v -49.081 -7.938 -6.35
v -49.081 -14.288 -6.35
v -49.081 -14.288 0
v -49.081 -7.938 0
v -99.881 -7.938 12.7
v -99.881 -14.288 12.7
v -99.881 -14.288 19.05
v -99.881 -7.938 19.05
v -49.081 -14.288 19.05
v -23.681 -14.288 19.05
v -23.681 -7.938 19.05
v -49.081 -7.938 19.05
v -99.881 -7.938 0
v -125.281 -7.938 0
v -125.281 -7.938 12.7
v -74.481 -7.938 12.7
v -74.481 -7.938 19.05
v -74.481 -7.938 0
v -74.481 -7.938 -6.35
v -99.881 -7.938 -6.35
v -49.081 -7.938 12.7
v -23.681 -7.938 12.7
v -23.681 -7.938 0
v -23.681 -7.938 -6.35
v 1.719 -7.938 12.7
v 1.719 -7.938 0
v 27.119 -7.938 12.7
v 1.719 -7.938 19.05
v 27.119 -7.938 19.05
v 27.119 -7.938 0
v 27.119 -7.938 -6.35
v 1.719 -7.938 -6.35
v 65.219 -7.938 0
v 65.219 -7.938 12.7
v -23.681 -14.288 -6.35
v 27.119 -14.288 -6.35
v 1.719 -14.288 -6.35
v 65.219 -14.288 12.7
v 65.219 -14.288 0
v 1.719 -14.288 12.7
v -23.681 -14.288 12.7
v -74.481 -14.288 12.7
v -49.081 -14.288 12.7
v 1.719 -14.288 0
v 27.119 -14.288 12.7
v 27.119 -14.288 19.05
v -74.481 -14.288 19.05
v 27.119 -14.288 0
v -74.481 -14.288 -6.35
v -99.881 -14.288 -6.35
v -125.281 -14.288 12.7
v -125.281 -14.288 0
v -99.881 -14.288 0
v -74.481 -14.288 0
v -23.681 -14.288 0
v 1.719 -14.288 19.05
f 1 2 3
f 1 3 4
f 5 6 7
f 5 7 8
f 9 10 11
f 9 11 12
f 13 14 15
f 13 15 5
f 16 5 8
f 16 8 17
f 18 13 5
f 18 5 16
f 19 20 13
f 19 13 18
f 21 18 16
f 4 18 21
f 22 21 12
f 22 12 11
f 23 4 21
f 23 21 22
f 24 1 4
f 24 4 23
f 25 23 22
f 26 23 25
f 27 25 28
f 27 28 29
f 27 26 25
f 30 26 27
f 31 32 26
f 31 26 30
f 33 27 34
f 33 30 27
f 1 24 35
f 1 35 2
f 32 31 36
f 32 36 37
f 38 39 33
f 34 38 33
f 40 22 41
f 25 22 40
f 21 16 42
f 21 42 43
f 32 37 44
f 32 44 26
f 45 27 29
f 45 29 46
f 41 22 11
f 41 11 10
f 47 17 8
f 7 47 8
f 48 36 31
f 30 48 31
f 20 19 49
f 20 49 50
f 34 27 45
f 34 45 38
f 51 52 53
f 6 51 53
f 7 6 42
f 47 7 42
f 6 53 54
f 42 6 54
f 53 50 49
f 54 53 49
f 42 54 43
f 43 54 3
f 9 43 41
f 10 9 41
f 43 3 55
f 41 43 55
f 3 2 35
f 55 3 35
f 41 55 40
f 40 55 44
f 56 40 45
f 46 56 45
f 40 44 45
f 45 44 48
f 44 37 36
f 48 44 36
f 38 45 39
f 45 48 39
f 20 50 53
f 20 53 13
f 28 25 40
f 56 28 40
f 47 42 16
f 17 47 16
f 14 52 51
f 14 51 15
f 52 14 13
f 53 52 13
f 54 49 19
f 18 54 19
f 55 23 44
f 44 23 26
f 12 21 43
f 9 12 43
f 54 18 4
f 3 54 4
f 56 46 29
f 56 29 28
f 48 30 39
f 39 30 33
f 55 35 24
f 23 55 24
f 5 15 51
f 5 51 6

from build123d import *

# Parameters (mm, degrees)
SKETCH1_W               = 190.5
SKETCH1_H               = 6.35
BOSS_EXTRUDE1_DEPTH     = 12.7
SKETCH2_W               = 25.4
SKETCH2_H               = 6.35
BOSS_EXTRUDE2_DEPTH     = 6.35
LPATTERN1_COUNT         = 3
LPATTERN1_PITCH         = 50.8
MIRROR1_COPY_1_SKETCH_W = 25.4
MIRROR1_COPY_1_SKETCH_H = 6.35
MIRROR1_COPY_1_DEPTH    = 6.35
MIRROR1_COPY_2_SKETCH_W = 25.4
MIRROR1_COPY_2_SKETCH_H = 6.35
MIRROR1_COPY_2_DEPTH    = 6.35


with BuildPart() as part:
    # Sketch1 → Boss-Extrude1 (new body)
    with BuildSketch(Plane.XY):
        with Locations((-30.030526088, -11.1125)):
            Rectangle(SKETCH1_W, SKETCH1_H)
    extrude(amount=BOSS_EXTRUDE1_DEPTH)

    # Sketch2 → Boss-Extrude2 (add)
    with BuildSketch(Plane(origin=(0, 0, 0), x_dir=(-1, 0, 0), z_dir=(0, 0, -1))):
        with Locations((87.180526088, -11.1125)):
            Rectangle(SKETCH2_W, SKETCH2_H)
    boss_extrude2 = extrude(amount=BOSS_EXTRUDE2_DEPTH)

    # LPattern1: Boss-Extrude2 ×3
    with Locations(*[(i * LPATTERN1_PITCH, 0, 0) for i in range(1, LPATTERN1_COUNT)]):
        add(boss_extrude2)

    # Mirror1: Boss-Extrude2 across plane
    add(boss_extrude2.mirror(Plane(origin=(-125.280526088, -20.6375, 6.35), x_dir=(1, 0, 0), z_dir=(0, 0, 1))))

    # Mirror1 copy 1 sketch → Mirror1 copy 1 (add)
    with BuildSketch(Plane(origin=(50.8, 0, 12.7), x_dir=(-1, 0, 0), z_dir=(0, 0, 1))):
        with Locations((87.180526088, 11.1125)):
            Rectangle(MIRROR1_COPY_1_SKETCH_W, MIRROR1_COPY_1_SKETCH_H)
    extrude(amount=MIRROR1_COPY_1_DEPTH)

    # Mirror1 copy 2 sketch → Mirror1 copy 2 (add)
    with BuildSketch(Plane(origin=(101.6, 0, 12.7), x_dir=(-1, 0, 0), z_dir=(0, 0, 1))):
        with Locations((87.180526088, 11.1125)):
            Rectangle(MIRROR1_COPY_2_SKETCH_W, MIRROR1_COPY_2_SKETCH_H)
    extrude(amount=MIRROR1_COPY_2_DEPTH)


solid = part.part
